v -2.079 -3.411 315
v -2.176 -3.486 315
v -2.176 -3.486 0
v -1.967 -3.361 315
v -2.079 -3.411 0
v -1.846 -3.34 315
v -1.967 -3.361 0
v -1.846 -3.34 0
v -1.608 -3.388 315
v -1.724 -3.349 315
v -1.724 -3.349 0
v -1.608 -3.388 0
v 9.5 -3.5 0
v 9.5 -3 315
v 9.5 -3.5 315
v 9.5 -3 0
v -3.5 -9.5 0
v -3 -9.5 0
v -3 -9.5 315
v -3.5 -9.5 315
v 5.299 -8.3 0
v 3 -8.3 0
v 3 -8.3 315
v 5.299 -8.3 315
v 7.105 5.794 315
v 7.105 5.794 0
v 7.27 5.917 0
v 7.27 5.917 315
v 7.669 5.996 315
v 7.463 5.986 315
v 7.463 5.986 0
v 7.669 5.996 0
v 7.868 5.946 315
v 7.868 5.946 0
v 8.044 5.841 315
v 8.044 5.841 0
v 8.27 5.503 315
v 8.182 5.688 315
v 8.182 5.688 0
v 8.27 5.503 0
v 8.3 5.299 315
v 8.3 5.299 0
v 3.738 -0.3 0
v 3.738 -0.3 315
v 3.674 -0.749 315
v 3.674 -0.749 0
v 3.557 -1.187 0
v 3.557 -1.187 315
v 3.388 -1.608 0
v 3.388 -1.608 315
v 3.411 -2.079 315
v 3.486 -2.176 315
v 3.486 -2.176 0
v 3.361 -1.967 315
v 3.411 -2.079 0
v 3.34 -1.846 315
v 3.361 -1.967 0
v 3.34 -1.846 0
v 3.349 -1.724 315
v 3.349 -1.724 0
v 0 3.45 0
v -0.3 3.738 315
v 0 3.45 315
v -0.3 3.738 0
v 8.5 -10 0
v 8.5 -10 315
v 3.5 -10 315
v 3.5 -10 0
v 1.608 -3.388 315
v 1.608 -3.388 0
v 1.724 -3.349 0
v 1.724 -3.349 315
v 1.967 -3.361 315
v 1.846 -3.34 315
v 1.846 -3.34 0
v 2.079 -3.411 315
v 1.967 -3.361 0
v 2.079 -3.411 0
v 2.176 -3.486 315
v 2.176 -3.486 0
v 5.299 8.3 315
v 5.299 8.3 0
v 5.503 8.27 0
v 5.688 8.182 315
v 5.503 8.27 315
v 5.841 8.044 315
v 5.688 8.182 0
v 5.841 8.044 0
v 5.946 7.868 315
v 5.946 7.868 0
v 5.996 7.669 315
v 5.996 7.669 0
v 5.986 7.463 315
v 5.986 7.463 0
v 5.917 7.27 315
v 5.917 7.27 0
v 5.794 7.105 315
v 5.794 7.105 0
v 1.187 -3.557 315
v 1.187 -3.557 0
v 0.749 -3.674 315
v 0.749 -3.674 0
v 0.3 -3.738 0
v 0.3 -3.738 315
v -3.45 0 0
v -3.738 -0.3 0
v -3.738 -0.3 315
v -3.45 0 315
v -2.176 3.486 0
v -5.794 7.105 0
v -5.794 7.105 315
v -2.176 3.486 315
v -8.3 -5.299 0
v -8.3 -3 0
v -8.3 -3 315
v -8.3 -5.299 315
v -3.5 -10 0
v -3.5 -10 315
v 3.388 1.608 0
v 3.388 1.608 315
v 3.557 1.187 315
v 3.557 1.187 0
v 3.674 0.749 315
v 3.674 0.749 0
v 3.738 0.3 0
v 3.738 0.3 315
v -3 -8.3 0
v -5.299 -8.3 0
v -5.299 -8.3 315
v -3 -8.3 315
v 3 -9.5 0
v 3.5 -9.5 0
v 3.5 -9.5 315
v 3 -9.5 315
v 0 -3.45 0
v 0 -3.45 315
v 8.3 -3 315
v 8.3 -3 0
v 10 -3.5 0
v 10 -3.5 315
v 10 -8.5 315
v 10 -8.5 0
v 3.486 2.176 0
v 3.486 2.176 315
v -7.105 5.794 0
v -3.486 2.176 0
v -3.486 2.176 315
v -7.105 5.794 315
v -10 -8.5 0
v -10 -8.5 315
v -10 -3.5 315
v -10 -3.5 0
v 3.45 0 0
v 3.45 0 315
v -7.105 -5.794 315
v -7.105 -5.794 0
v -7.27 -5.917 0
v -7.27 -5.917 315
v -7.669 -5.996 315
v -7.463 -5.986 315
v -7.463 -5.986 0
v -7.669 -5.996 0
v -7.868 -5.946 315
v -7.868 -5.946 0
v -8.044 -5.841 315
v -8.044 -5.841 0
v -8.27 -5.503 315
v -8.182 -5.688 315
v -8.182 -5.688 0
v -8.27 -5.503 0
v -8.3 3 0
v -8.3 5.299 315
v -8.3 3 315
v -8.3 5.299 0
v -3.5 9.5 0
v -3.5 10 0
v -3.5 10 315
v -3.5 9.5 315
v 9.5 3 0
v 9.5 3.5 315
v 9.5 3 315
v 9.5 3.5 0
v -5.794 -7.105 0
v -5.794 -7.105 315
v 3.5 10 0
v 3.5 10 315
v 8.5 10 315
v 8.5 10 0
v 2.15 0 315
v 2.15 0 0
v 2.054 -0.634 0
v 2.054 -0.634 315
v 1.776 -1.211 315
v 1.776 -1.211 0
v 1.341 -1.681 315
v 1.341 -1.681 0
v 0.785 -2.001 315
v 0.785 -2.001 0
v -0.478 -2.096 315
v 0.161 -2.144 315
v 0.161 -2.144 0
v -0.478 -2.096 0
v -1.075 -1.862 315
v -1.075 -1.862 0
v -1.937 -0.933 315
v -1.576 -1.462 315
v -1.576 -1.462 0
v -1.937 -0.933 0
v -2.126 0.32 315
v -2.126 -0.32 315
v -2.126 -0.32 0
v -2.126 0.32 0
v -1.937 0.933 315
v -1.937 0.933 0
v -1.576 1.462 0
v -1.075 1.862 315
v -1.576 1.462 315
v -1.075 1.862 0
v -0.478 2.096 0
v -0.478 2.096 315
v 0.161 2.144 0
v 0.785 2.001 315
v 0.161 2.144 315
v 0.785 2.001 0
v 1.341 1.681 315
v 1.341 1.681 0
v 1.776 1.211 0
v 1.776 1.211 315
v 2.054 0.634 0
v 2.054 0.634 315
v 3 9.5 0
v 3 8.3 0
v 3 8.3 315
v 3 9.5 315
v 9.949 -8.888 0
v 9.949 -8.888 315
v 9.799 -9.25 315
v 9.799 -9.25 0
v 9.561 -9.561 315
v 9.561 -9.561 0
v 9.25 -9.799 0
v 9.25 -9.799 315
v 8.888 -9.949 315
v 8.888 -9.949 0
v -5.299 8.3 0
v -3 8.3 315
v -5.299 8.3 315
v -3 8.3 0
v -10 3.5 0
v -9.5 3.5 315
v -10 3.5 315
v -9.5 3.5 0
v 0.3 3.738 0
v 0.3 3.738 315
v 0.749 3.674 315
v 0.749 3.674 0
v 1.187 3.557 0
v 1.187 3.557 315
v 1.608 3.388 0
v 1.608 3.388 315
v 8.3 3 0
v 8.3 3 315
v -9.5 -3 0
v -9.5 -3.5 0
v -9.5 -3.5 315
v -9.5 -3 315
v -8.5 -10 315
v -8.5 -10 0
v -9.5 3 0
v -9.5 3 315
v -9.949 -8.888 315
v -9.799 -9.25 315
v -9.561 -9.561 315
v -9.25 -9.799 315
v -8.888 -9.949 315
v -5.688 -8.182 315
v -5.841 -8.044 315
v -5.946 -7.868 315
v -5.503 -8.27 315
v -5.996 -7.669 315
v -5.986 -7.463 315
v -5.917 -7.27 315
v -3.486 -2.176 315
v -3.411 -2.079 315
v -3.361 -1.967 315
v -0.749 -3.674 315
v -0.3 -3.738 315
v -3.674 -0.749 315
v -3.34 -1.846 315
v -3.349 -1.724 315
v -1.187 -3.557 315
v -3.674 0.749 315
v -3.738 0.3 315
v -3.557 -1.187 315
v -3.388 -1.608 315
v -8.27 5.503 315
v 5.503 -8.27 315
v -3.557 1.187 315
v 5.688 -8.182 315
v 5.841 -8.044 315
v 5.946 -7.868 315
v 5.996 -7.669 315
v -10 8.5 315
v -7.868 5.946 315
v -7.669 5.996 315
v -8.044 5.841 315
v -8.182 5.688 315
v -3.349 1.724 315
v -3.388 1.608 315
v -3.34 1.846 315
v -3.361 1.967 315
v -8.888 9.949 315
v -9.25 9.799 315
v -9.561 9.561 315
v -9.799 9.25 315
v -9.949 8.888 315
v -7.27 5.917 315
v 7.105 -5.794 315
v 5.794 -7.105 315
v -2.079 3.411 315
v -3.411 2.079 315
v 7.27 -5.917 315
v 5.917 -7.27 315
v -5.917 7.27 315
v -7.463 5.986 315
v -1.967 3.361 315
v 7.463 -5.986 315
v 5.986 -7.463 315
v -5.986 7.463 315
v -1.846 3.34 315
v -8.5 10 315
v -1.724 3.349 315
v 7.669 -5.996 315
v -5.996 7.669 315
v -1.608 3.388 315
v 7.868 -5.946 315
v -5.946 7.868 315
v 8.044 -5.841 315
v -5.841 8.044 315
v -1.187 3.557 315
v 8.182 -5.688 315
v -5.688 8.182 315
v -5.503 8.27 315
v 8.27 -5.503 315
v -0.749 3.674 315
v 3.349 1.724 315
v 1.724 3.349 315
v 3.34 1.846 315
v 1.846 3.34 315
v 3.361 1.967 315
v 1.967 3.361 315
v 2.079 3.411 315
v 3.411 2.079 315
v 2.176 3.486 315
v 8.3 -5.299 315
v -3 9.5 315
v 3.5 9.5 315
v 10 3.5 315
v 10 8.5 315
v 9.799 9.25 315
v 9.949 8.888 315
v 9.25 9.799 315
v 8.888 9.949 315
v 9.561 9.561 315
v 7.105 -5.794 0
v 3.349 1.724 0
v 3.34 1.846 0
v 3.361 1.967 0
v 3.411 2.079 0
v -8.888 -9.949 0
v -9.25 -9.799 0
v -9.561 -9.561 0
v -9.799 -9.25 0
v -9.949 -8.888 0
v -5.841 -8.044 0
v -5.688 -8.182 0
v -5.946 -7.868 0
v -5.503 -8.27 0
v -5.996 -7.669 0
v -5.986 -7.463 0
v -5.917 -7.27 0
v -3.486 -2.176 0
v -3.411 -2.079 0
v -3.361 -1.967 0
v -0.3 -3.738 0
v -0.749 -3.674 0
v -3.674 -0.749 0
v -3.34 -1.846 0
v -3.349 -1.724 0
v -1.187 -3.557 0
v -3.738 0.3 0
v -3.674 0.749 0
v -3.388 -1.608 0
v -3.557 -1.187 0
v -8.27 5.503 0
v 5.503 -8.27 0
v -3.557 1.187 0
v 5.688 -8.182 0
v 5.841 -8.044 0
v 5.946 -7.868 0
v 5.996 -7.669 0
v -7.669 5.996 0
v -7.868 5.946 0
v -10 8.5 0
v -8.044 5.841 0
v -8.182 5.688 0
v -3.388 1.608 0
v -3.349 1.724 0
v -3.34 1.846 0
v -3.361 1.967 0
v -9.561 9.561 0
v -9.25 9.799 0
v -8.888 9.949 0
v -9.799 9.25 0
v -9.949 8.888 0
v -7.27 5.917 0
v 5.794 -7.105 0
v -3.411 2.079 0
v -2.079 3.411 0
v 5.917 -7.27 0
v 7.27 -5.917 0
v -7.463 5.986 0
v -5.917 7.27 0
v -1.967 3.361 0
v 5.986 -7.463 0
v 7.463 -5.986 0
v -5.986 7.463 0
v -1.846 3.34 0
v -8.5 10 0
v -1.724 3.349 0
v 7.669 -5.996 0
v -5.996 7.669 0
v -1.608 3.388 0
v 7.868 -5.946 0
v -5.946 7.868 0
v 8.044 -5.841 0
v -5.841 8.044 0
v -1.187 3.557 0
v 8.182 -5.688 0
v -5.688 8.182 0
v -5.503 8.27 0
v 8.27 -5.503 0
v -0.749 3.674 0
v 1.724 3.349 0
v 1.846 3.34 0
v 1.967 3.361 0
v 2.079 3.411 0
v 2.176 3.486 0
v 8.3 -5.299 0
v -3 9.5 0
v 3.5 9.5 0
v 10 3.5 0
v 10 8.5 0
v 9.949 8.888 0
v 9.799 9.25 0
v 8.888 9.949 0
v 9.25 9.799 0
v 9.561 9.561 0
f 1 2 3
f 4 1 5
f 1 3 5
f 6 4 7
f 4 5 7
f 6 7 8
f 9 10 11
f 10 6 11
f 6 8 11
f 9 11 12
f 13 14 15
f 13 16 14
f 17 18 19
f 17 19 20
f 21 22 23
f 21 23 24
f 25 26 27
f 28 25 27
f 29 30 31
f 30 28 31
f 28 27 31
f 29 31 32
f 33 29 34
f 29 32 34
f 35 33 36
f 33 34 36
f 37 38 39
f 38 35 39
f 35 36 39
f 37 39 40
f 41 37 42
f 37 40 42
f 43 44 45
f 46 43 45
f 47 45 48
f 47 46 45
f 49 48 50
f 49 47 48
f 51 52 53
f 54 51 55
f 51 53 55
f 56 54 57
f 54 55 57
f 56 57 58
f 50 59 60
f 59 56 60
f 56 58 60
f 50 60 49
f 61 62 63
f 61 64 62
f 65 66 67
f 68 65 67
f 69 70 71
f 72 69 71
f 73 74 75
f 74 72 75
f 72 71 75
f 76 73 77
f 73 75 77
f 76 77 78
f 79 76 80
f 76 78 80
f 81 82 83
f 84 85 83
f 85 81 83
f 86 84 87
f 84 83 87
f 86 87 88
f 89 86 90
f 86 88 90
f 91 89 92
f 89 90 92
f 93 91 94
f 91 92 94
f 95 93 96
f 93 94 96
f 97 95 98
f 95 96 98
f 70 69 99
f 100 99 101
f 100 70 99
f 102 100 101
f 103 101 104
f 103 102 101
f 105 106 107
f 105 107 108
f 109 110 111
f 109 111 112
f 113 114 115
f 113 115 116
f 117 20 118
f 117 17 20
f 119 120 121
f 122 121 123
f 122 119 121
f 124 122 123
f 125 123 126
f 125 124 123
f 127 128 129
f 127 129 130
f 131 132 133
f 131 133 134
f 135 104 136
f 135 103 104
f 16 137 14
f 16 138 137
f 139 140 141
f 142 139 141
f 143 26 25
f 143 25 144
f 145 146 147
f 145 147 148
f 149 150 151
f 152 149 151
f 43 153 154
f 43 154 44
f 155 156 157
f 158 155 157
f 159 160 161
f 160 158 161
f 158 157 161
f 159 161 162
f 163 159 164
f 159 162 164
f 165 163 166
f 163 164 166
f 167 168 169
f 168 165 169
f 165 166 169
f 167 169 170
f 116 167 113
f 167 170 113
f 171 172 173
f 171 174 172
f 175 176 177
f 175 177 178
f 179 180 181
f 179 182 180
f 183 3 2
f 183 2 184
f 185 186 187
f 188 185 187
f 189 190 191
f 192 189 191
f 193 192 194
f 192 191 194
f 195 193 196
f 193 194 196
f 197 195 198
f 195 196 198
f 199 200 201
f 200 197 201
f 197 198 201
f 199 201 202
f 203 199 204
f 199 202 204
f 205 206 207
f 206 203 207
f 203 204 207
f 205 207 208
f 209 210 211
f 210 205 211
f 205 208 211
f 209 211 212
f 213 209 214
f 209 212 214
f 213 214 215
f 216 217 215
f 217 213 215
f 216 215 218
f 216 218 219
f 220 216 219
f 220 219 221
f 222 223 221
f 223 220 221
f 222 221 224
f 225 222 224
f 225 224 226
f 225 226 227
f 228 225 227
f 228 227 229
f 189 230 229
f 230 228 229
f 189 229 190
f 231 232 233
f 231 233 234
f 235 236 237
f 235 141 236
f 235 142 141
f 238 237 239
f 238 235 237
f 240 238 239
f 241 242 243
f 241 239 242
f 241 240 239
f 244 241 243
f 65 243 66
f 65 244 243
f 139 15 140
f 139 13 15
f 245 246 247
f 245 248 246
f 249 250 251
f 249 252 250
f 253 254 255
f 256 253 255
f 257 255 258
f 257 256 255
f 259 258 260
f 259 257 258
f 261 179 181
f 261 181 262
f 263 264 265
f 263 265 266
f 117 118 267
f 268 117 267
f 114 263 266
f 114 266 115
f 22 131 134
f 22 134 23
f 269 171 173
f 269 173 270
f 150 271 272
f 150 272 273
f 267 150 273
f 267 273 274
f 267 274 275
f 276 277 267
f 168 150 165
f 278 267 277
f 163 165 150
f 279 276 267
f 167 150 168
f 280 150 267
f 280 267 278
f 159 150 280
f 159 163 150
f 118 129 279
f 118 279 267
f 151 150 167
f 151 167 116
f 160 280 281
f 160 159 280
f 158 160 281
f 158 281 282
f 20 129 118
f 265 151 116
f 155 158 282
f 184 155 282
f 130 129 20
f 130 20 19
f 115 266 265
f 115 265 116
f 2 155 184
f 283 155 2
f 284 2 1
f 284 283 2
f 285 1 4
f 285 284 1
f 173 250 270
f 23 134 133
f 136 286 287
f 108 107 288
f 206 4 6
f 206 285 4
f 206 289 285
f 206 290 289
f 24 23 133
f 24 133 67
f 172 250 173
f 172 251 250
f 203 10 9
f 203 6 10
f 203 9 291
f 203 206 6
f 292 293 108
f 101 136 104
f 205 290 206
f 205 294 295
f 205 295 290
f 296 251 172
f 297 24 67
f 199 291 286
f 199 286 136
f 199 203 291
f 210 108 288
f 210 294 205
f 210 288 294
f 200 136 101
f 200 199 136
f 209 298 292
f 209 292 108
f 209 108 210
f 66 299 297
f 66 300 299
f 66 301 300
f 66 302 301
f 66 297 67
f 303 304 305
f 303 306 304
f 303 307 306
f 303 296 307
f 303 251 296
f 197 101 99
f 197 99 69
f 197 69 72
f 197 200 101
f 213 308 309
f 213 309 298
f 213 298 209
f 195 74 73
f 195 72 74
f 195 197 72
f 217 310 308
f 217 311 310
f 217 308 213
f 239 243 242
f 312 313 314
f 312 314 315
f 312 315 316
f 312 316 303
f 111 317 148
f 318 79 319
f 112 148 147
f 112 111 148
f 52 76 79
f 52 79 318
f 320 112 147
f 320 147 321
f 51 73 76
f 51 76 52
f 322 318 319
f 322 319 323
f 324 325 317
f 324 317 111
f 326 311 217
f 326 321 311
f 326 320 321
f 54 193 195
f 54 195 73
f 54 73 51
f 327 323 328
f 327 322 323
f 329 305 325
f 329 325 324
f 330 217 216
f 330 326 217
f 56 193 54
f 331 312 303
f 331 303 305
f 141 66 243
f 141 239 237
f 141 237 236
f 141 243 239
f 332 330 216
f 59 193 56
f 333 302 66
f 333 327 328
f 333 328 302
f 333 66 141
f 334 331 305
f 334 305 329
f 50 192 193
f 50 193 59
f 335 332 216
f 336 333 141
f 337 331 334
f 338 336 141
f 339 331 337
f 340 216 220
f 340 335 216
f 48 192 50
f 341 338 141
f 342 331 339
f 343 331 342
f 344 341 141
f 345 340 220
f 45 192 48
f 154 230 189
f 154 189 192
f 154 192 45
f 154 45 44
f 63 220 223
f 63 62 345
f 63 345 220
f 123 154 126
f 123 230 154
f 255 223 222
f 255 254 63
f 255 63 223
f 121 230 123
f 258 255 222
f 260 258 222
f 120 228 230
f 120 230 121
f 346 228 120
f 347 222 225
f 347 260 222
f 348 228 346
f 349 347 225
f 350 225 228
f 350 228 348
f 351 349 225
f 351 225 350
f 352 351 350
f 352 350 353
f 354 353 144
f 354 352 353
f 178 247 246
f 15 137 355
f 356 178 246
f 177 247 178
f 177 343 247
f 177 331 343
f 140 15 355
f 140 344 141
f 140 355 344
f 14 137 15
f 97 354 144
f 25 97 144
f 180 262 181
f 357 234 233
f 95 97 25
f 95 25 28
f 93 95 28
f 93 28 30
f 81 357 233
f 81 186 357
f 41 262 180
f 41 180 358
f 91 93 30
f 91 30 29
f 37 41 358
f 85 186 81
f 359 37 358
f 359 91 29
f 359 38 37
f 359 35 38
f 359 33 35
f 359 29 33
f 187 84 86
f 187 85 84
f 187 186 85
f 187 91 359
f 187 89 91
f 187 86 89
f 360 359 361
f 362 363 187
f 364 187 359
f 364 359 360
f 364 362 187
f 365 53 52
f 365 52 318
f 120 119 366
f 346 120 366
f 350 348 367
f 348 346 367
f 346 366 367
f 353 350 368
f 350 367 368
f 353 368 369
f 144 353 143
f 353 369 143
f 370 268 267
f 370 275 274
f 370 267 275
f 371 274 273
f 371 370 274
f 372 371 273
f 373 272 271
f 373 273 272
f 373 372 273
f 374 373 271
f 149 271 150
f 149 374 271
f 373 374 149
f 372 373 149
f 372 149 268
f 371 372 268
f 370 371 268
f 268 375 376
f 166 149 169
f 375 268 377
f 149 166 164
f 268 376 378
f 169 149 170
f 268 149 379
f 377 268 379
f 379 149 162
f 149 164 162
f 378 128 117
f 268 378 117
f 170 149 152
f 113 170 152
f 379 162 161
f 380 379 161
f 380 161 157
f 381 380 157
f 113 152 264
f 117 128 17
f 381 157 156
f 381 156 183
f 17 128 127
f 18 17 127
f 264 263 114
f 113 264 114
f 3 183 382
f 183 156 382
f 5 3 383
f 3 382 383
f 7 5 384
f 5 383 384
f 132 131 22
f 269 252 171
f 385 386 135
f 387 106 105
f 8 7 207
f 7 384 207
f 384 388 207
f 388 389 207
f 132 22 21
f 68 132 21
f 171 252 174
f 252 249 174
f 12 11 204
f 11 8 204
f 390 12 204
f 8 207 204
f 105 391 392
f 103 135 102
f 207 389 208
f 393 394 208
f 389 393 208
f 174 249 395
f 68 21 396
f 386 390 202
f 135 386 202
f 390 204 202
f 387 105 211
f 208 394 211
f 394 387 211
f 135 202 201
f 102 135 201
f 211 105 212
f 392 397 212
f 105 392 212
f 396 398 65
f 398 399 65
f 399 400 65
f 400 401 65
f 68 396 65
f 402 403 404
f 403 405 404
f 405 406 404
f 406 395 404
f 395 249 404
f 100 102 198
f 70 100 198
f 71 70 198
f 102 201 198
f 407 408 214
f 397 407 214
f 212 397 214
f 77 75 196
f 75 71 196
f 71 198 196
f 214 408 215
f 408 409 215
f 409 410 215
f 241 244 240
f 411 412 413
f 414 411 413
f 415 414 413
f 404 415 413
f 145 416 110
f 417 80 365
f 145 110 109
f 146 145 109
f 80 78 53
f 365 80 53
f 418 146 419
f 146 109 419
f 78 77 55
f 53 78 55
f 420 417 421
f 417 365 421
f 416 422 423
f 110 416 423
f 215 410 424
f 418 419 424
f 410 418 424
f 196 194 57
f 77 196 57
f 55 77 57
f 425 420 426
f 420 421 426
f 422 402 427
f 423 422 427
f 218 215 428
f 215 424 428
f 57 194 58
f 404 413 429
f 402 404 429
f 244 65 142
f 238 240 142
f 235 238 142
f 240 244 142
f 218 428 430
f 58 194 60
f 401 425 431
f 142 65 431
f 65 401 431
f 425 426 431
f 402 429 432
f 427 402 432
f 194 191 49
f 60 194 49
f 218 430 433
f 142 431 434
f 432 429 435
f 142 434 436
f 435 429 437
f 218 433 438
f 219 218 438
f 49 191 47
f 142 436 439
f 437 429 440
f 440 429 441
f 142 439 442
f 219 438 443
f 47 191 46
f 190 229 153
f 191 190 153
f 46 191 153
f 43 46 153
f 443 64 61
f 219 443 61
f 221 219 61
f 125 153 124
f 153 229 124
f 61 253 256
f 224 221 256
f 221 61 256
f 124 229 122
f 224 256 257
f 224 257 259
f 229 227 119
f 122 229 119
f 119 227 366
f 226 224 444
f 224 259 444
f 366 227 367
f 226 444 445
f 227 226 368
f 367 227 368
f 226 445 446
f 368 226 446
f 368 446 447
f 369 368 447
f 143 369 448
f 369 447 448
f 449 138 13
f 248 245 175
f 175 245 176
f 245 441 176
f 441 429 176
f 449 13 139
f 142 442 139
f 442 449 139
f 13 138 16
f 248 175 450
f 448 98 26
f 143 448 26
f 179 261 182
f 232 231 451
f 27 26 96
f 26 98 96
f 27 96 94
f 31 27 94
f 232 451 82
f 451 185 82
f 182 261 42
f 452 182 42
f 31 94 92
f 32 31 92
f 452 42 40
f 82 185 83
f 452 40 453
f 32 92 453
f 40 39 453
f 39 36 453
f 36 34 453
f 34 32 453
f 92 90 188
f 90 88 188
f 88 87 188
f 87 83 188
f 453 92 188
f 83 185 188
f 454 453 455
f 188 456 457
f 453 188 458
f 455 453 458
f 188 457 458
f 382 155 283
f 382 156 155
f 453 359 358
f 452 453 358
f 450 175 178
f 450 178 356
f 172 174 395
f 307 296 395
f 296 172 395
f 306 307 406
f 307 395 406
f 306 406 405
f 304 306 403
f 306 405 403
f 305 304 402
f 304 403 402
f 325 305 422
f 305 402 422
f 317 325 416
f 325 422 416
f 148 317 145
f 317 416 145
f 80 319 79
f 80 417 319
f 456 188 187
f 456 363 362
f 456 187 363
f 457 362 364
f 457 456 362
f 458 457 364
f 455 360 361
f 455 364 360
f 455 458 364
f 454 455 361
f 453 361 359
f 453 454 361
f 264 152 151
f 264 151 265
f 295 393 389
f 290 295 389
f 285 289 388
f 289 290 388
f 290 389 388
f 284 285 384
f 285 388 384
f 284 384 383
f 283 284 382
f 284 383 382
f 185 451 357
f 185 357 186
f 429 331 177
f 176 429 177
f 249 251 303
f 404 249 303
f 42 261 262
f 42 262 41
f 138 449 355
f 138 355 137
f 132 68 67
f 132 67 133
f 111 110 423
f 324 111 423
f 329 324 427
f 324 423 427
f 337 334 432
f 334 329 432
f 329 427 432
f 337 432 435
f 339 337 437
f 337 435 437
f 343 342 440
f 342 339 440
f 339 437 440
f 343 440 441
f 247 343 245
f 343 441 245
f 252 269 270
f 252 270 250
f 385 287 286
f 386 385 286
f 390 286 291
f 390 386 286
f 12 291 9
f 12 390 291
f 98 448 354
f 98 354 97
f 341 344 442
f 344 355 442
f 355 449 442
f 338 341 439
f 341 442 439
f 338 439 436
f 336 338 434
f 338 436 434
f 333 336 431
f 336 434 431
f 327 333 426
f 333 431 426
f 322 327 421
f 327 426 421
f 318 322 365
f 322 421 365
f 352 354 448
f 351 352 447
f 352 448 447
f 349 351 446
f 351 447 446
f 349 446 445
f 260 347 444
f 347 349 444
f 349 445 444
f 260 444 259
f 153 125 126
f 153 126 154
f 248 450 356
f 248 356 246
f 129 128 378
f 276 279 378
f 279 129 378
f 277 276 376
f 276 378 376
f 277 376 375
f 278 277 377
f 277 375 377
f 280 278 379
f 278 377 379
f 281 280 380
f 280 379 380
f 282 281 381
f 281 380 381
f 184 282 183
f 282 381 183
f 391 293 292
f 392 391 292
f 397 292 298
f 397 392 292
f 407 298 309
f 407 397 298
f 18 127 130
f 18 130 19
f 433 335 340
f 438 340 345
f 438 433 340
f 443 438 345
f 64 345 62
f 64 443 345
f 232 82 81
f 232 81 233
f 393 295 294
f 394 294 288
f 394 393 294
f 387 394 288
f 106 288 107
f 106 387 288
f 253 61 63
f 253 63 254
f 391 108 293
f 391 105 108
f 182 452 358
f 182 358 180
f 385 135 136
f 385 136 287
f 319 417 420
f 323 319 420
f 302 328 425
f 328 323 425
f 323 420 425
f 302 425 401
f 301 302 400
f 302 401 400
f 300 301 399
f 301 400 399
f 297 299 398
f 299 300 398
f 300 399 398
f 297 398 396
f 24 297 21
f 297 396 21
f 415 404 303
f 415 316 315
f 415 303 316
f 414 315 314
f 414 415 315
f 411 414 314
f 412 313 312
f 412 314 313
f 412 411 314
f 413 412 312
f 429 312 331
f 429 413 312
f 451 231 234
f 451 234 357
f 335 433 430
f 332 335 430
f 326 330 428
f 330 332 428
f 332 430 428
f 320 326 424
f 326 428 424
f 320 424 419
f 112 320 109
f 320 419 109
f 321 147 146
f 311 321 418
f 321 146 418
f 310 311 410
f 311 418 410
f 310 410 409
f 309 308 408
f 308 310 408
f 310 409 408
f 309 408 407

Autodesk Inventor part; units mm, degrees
ref_plane "YZ Plane" through (0, 0, 0) normal (1, 0, 0) x (0, 1, 0)
ref_plane "XZ Plane" through (0, 0, 0) normal (0, 1, 0) x (-1, 0, 0)
ref_plane "XY Plane" through (0, 0, 0) normal (0, 0, 1) x (1, 0, 0)
sketch "Skizze1" plane through (0, 0, 0) normal (0, 0, 1) x (1, 0, 0)
  circle A0 centre (0, 0) radius 2.15
  line L0 (-3.5, -9.5) -> (-3.5, -10)
  line L1 (-3, -9.5) -> (-3.5, -9.5)
  line L2 (-3, -8.3) -> (-3, -9.5)
  line L3 (-5.2994, -8.3) -> (-3, -8.3)
  arc A1 (-5.7944, -7.105) -> (-5.2994, -8.3) centre (-5.2994, -7.6) ccw
  line L4 (-2.1755, -3.4861) -> (-5.7944, -7.105)
  arc A2 (-1.6076, -3.388) -> (-2.1755, -3.4861) centre (-1.8219, -3.8397) ccw
  arc A3 (-1.6076, -3.388) -> (-0.3, -3.738) centre (0, 0) ccw
  line L5 (0, -3.45) -> (-0.3, -3.738)
  line L6 (0.3, -3.738) -> (0, -3.45)
  arc A4 (0.3, -3.738) -> (1.6076, -3.388) centre (0, 0) ccw
  arc A5 (2.1755, -3.4861) -> (1.6076, -3.388) centre (1.8219, -3.8397) ccw
  line L7 (5.7944, -7.105) -> (2.1755, -3.4861)
  arc A6 (5.2994, -8.3) -> (5.7944, -7.105) centre (5.2994, -7.6) ccw
  line L8 (3, -8.3) -> (5.2994, -8.3)
  line L9 (3, -9.5) -> (3, -8.3)
  line L10 (3.5, -9.5) -> (3, -9.5)
  line L11 (3.5, -10) -> (3.5, -9.5)
  line L12 (8.5, -10) -> (3.5, -10)
  arc A7 (8.5, -10) -> (10, -8.5) centre (8.5, -8.5) ccw
  line L13 (10, -3.5) -> (10, -8.5)
  line L14 (9.5, -3.5) -> (10, -3.5)
  line L15 (9.5, -3) -> (9.5, -3.5)
  line L16 (8.3, -3) -> (9.5, -3)
  line L17 (8.3, -5.2994) -> (8.3, -3)
  arc A8 (7.105, -5.7944) -> (8.3, -5.2994) centre (7.6, -5.2994) ccw
  line L18 (3.4861, -2.1755) -> (7.105, -5.7944)
  arc A9 (3.388, -1.6076) -> (3.4861, -2.1755) centre (3.8397, -1.8219) ccw
  arc A10 (3.388, -1.6076) -> (3.738, -0.3) centre (0, 0) ccw
  line L19 (3.45, 0) -> (3.738, -0.3)
  line L20 (3.738, 0.3) -> (3.45, 0)
  arc A11 (3.738, 0.3) -> (3.388, 1.6076) centre (0, 0) ccw
  arc A12 (3.4861, 2.1755) -> (3.388, 1.6076) centre (3.8397, 1.8219) ccw
  line L21 (7.105, 5.7944) -> (3.4861, 2.1755)
  arc A13 (8.3, 5.2994) -> (7.105, 5.7944) centre (7.6, 5.2994) ccw
  line L22 (8.3, 3) -> (8.3, 5.2994)
  line L23 (9.5, 3) -> (8.3, 3)
  line L24 (9.5, 3.5) -> (9.5, 3)
  line L25 (10, 3.5) -> (9.5, 3.5)
  line L26 (10, 8.5) -> (10, 3.5)
  arc A14 (10, 8.5) -> (8.5, 10) centre (8.5, 8.5) ccw
  line L27 (3.5, 10) -> (8.5, 10)
  line L28 (3.5, 9.5) -> (3.5, 10)
  line L29 (3, 9.5) -> (3.5, 9.5)
  line L30 (3, 8.3) -> (3, 9.5)
  line L31 (5.2994, 8.3) -> (3, 8.3)
  arc A15 (5.7944, 7.105) -> (5.2994, 8.3) centre (5.2994, 7.6) ccw
  line L32 (2.1755, 3.4861) -> (5.7944, 7.105)
  arc A16 (1.6076, 3.388) -> (2.1755, 3.4861) centre (1.8219, 3.8397) ccw
  arc A17 (1.6076, 3.388) -> (0.3, 3.738) centre (0, 0) ccw
  line L33 (0, 3.45) -> (0.3, 3.738)
  line L34 (-0.3, 3.738) -> (0, 3.45)
  arc A18 (-0.3, 3.738) -> (-1.6076, 3.388) centre (0, 0) ccw
  arc A19 (-2.1755, 3.4861) -> (-1.6076, 3.388) centre (-1.8219, 3.8397) ccw
  line L35 (-5.7944, 7.105) -> (-2.1755, 3.4861)
  arc A20 (-5.2994, 8.3) -> (-5.7944, 7.105) centre (-5.2994, 7.6) ccw
  line L36 (-3, 8.3) -> (-5.2994, 8.3)
  line L37 (-3, 9.5) -> (-3, 8.3)
  line L38 (-3.5, 9.5) -> (-3, 9.5)
  line L39 (-3.5, 10) -> (-3.5, 9.5)
  line L40 (-8.5, 10) -> (-3.5, 10)
  arc A21 (-8.5, 10) -> (-10, 8.5) centre (-8.5, 8.5) ccw
  line L41 (-10, 3.5) -> (-10, 8.5)
  line L42 (-9.5, 3.5) -> (-10, 3.5)
  line L43 (-9.5, 3) -> (-9.5, 3.5)
  line L44 (-8.3, 3) -> (-9.5, 3)
  line L45 (-8.3, 5.2994) -> (-8.3, 3)
  arc A22 (-7.105, 5.7944) -> (-8.3, 5.2994) centre (-7.6, 5.2994) ccw
  line L46 (-3.4861, 2.1755) -> (-7.105, 5.7944)
  arc A23 (-3.388, 1.6076) -> (-3.4861, 2.1755) centre (-3.8397, 1.8219) ccw
  arc A24 (-3.388, 1.6076) -> (-3.738, 0.3) centre (0, 0) ccw
  line L47 (-3.45, 0) -> (-3.738, 0.3)
  line L48 (-3.738, -0.3) -> (-3.45, 0)
  arc A25 (-3.738, -0.3) -> (-3.388, -1.6076) centre (0, 0) ccw
  arc A26 (-3.4861, -2.1755) -> (-3.388, -1.6076) centre (-3.8397, -1.8219) ccw
  line L49 (-7.105, -5.7944) -> (-3.4861, -2.1755)
  arc A27 (-8.3, -5.2994) -> (-7.105, -5.7944) centre (-7.6, -5.2994) ccw
  line L50 (-8.3, -3) -> (-8.3, -5.2994)
  line L51 (-9.5, -3) -> (-8.3, -3)
  line L52 (-9.5, -3.5) -> (-9.5, -3)
  line L53 (-10, -3.5) -> (-9.5, -3.5)
  line L54 (-10, -8.5) -> (-10, -3.5)
  arc A28 (-10, -8.5) -> (-8.5, -10) centre (-8.5, -8.5) ccw
  line L55 (-3.5, -10) -> (-8.5, -10)
  point P0 (18.4588, -14.4564)
extrude "Extrusion1" add sketch "Skizze1" along normal blind 315
properties part number "400mm" material "Aluminium 6061"
